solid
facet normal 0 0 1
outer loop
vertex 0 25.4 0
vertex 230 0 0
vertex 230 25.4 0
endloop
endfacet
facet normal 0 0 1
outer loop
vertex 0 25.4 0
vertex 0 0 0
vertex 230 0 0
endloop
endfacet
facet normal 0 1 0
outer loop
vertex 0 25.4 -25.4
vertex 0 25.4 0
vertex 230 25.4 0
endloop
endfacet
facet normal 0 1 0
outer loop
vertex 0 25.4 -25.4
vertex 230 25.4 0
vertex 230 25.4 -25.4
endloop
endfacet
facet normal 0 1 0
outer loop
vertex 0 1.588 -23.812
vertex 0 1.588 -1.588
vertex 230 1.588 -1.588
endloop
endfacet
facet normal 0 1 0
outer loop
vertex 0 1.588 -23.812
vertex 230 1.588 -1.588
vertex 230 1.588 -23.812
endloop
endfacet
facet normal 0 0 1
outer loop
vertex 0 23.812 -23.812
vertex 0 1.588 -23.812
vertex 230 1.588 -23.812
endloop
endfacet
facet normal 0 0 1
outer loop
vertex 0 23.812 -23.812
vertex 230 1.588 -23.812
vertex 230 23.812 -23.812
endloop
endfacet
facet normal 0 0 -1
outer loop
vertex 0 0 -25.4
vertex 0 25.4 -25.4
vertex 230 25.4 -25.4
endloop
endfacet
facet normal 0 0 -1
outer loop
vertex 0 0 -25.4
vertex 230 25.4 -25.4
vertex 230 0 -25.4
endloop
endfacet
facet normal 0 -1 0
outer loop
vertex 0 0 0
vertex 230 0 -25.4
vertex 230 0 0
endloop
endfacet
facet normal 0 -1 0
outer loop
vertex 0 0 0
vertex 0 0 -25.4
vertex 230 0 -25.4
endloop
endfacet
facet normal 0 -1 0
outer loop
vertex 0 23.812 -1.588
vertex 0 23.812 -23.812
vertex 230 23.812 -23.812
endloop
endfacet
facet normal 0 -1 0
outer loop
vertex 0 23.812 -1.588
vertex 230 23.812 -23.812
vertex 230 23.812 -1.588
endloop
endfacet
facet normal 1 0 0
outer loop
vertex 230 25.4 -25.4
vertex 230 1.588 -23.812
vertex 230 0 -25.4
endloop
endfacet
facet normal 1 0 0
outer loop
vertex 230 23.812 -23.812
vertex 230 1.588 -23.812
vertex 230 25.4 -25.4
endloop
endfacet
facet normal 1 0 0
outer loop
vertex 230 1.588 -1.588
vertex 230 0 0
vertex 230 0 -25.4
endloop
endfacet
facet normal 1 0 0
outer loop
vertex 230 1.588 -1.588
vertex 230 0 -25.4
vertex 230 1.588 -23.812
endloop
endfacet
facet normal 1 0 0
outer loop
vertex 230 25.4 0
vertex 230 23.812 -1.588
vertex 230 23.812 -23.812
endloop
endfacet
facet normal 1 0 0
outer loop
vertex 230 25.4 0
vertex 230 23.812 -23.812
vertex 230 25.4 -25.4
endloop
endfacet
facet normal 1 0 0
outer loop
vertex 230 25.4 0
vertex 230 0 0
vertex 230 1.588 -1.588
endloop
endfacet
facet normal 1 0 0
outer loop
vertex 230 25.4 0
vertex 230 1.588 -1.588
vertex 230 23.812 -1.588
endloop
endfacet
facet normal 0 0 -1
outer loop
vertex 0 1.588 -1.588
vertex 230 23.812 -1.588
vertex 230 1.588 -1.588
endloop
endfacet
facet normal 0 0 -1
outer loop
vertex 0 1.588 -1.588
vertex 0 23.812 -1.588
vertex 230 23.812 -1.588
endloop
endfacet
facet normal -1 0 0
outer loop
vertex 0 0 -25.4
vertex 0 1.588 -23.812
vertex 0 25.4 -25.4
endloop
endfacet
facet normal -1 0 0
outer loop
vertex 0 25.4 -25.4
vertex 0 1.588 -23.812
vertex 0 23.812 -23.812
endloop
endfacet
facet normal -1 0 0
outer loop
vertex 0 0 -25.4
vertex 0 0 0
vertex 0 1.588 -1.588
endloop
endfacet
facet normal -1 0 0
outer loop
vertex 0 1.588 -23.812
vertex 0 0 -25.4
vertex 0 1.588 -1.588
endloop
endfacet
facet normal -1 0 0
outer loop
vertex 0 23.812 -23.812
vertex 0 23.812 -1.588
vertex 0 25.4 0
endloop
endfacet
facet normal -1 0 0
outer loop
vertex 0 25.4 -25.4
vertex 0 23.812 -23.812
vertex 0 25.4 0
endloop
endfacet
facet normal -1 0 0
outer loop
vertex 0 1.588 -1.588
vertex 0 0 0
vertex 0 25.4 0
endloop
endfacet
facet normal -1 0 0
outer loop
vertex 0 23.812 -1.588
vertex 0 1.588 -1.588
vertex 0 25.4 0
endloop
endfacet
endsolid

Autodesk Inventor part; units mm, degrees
ref_plane "YZ Plane" through (0, 0, 0) normal (1, 0, 0) x (0, 1, 0)
ref_plane "XZ Plane" through (0, 0, 0) normal (0, 1, 0) x (-1, 0, 0)
ref_plane "XY Plane" through (0, 0, 0) normal (0, 0, 1) x (1, 0, 0)
sketch "Sketch1" plane through (0, 0, 0) normal (1, 0, 0) x (0, 1, 0)
  line L0 (0, 0) -> (25.4, 0)
  line L1 (25.4, 0) -> (25.4, -25.4)
  line L2 (25.4, -25.4) -> (0, -25.4)
  line L3 (0, -25.4) -> (0, 0)
  line L4 (23.8125, -23.8125) -> (23.8125, -1.5875)
  line L5 (23.8125, -1.5875) -> (1.5875, -1.5875)
  line L6 (1.5875, -1.5875) -> (1.5875, -23.8125)
  line L7 (1.5875, -23.8125) -> (23.8125, -23.8125)
  dimension "d0" = 25.4
  dimension "d1" = 25.4
  dimension "d2" = 1.5875
extrude "Extrusion1" add sketch "Sketch1" along normal blind 230
sketch "Sketch2" plane through (0, 25.4, 0) normal (0, 1, 0) x (1, 0, 0)
  point P0 (0, 0)
properties part number "HOrizontal_Beam_Short"
